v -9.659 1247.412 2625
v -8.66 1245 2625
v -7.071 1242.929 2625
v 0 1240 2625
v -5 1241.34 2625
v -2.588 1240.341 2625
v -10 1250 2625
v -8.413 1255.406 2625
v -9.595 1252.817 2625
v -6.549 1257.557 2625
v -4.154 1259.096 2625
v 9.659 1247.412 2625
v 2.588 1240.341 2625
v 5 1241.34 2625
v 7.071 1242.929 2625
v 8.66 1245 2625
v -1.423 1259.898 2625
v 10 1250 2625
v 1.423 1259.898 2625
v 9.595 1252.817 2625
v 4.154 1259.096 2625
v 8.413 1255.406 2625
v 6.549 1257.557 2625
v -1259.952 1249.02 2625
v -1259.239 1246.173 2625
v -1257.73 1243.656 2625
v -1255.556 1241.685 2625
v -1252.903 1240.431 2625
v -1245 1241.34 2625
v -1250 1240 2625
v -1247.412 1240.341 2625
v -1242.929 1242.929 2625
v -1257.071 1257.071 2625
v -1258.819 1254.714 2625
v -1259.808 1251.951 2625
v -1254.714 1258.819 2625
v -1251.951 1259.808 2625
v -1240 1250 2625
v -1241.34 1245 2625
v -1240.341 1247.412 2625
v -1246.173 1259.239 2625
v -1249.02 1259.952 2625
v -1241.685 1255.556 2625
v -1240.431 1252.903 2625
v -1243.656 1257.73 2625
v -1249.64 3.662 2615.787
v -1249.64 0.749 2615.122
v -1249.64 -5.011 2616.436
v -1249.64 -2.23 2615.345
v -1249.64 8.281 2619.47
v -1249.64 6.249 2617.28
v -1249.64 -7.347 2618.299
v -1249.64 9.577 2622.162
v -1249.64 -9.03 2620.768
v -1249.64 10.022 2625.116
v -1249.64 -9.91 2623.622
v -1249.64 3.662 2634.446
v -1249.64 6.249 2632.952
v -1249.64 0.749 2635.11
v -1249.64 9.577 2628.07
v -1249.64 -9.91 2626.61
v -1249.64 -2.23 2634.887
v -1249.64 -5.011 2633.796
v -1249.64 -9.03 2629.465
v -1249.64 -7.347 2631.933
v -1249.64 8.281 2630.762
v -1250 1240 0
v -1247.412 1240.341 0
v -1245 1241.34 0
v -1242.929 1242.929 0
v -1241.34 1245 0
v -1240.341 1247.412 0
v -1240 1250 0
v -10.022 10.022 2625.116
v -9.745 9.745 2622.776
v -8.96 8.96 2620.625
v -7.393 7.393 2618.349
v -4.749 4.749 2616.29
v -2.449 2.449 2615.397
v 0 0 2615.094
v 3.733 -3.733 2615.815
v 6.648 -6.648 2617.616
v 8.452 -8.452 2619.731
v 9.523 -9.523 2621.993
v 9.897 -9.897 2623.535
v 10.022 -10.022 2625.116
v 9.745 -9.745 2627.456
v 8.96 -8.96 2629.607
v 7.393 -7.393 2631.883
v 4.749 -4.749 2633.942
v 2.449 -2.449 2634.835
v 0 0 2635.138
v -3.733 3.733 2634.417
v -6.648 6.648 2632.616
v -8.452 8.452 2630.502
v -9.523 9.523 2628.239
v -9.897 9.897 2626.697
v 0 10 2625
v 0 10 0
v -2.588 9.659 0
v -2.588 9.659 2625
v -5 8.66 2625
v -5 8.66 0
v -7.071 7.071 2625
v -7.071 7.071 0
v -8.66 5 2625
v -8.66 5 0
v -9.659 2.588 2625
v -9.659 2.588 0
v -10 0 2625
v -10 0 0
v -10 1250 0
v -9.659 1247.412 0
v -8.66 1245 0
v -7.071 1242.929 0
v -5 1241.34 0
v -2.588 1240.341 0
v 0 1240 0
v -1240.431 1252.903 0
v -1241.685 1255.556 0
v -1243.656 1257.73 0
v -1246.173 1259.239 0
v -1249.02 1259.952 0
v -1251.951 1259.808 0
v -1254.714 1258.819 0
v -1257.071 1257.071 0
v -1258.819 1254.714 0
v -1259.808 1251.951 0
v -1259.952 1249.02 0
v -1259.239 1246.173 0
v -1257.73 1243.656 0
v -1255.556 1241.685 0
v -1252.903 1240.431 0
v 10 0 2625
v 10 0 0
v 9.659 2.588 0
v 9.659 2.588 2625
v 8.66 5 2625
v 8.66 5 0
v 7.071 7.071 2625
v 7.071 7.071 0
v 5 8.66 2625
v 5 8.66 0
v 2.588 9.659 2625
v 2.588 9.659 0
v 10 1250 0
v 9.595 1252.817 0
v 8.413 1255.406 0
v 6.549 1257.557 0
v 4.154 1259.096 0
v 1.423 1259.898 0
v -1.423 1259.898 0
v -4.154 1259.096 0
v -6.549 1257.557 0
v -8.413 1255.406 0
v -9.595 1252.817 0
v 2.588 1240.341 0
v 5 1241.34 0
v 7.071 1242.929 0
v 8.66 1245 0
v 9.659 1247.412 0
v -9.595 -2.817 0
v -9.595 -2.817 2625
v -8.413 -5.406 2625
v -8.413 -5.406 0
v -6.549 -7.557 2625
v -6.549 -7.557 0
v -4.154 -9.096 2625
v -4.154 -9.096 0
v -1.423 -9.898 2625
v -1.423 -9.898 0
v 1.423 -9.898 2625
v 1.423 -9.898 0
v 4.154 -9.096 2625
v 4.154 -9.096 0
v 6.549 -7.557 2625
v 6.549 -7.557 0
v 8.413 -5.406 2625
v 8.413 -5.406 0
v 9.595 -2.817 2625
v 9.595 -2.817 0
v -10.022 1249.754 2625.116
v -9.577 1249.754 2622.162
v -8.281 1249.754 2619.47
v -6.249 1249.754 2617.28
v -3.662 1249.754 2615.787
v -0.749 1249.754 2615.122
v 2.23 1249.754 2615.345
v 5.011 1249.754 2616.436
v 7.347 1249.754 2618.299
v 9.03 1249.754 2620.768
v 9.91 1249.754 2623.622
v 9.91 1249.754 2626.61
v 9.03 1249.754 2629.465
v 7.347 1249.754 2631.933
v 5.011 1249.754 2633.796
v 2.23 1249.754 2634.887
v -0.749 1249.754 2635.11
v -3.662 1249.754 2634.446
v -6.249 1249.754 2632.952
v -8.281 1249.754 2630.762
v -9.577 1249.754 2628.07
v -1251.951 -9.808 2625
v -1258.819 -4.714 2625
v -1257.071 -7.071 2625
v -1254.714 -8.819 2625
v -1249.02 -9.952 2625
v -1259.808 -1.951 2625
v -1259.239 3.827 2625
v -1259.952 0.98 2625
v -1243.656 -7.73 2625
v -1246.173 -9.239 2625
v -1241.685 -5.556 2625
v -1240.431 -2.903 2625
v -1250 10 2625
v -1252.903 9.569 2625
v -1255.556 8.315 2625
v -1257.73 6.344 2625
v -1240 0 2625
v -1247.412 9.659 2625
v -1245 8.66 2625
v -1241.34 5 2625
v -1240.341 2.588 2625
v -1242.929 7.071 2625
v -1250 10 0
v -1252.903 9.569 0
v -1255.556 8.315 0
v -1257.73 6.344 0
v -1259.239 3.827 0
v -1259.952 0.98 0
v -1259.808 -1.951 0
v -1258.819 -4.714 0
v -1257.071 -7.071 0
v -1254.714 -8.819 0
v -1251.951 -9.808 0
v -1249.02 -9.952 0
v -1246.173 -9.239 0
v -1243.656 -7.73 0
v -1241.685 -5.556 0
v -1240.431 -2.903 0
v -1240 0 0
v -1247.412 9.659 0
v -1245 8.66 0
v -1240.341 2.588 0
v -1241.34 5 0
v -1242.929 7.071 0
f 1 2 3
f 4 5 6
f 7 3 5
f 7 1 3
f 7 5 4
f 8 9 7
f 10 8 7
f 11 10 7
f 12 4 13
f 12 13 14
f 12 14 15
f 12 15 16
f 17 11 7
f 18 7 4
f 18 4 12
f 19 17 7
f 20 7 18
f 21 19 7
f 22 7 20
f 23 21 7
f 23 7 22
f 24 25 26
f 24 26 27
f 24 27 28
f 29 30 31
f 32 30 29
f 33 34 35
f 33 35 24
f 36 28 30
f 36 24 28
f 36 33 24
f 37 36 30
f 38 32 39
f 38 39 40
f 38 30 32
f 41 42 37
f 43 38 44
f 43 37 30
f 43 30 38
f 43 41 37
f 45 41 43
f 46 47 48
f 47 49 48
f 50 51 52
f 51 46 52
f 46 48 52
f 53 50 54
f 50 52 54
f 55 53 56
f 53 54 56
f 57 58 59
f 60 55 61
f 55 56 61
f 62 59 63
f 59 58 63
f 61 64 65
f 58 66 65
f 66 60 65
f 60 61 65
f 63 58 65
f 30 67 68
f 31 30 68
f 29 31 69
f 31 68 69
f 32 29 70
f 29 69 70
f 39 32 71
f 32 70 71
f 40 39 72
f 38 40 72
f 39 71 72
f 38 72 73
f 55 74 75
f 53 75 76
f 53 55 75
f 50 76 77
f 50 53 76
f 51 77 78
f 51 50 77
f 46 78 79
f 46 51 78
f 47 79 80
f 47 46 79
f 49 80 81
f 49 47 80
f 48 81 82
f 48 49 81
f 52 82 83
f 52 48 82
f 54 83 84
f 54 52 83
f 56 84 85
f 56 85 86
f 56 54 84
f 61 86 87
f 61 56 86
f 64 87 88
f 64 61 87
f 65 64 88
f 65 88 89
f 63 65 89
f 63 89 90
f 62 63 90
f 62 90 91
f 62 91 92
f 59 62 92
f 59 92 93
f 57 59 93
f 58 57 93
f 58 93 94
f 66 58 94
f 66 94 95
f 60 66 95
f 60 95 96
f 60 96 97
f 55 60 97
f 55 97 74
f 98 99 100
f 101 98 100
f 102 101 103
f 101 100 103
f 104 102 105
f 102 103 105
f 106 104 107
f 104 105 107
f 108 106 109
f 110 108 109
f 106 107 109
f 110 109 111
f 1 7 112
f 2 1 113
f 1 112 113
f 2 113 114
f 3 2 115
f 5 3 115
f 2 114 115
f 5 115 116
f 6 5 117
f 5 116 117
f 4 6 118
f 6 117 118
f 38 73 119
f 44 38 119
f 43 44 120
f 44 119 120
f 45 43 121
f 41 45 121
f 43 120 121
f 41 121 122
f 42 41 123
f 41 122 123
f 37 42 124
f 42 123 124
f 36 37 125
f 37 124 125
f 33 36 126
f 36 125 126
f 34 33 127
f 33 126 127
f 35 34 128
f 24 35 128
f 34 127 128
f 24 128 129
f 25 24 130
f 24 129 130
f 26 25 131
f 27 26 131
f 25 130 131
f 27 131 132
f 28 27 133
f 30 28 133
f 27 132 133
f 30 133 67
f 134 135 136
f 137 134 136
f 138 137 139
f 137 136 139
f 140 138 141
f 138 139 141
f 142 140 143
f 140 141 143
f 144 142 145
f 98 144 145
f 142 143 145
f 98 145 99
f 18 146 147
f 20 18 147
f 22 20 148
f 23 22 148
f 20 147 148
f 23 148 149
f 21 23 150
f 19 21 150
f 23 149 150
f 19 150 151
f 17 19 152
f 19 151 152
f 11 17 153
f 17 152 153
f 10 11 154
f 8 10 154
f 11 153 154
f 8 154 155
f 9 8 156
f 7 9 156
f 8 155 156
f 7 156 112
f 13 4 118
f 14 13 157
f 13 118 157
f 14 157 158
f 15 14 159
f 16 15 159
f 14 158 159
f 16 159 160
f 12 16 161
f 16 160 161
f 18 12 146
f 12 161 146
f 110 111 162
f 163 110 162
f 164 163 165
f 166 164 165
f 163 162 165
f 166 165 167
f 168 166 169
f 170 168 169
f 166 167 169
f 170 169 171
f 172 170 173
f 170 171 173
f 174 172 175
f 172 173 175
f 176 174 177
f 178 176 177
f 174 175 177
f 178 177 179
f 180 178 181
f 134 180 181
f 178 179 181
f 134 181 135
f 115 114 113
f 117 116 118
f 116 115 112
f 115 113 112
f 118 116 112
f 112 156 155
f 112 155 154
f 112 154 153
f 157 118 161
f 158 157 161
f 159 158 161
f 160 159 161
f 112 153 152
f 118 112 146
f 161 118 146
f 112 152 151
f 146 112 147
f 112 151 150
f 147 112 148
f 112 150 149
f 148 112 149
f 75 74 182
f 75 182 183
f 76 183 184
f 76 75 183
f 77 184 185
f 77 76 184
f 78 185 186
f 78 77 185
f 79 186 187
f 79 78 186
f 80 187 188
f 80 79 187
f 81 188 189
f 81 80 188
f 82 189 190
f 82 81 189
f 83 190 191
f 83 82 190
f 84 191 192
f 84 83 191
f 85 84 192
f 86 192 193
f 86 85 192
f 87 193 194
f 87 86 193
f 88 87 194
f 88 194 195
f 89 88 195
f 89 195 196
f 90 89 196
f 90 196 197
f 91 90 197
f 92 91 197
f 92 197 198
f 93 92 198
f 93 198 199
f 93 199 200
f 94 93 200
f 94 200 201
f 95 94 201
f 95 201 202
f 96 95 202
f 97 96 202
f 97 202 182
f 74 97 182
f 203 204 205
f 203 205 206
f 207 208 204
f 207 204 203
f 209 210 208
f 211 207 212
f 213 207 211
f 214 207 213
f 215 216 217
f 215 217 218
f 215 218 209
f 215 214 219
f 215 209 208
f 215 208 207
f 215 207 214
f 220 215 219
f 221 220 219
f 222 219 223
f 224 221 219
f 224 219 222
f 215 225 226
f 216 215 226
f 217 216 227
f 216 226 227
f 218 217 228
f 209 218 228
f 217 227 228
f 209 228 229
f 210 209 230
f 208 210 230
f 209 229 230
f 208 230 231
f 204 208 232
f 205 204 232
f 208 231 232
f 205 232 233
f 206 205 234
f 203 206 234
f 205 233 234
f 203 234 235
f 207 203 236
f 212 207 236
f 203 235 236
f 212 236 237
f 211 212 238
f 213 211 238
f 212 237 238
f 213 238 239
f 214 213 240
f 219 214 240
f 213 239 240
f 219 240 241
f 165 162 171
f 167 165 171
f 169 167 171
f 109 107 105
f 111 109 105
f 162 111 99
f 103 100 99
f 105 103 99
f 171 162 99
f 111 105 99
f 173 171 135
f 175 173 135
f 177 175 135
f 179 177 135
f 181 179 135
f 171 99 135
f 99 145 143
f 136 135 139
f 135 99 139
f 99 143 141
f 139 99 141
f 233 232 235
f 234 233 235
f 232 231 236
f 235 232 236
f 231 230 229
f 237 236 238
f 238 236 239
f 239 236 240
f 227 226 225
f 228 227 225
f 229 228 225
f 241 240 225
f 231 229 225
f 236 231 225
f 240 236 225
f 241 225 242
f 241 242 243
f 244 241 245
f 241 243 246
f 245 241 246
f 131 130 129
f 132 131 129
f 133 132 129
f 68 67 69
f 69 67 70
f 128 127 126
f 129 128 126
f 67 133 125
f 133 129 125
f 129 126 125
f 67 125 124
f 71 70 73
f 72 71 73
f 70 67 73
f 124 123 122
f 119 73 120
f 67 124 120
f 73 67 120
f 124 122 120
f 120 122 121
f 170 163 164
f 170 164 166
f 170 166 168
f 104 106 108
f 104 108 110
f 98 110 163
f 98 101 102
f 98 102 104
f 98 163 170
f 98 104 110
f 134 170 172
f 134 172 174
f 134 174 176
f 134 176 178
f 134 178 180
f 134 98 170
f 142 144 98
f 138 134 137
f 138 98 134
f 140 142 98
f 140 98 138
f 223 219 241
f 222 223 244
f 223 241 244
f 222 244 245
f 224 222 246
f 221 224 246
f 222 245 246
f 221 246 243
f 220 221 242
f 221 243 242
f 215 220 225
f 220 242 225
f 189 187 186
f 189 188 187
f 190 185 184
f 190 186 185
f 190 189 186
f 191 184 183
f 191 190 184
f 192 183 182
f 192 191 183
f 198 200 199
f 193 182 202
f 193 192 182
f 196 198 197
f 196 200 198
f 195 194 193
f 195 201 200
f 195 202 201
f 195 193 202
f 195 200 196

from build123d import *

# Parameters (mm, degrees)
F1_DEPTH = 2625
F4_R     = 10.0223853087


with BuildPart() as f1:
    # F0 (on Top) → F1 (new body)
    with BuildSketch(Plane.XY):
        with BuildLine():
            Line((0, 1250), (0, 1240))
            ThreePointArc((0, 1240), (7.0710678119, 1242.9289321881), (10, 1250))
            ThreePointArc((10, 1250), (0, 1260), (-10, 1250))
            Line((-10, 1250), (0, 1250))
        make_face()
        with BuildLine():
            ThreePointArc((-10, 1250), (-7.0710678119, 1242.9289321881), (0, 1240))
            Line((0, 1240), (0, 1250))
            Line((0, 1250), (-10, 1250))
        make_face()
    extrude(amount=F1_DEPTH)


with BuildPart() as f1b:
    # F0 (on Top) → F1, piece 2 (new body)
    with BuildSketch(Plane.XY):
        with BuildLine():
            Line((-1250, 1250), (-1240, 1250))
            ThreePointArc((-1240, 1250), (-1257.0710678119, 1257.0710678119), (-1250, 1240))
            Line((-1250, 1240), (-1250, 1250))
        make_face()
        with BuildLine():
            ThreePointArc((-1250, 1240), (-1242.9289321881, 1242.9289321881), (-1240, 1250))
            Line((-1240, 1250), (-1250, 1250))
            Line((-1250, 1250), (-1250, 1240))
        make_face()
    extrude(amount=F1_DEPTH)


with BuildPart() as f1c:
    # F0 (on Top) → F1, piece 3 (new body)
    with BuildSketch(Plane.XY):
        with BuildLine():
            ThreePointArc((-1250, 10), (-1257.0710678119, -7.0710678119), (-1240, 0))
            Line((-1240, 0), (-1250, 0))
            Line((-1250, 0), (-1250, 10))
        make_face()
        with BuildLine():
            Line((-1250, 0), (-1240, 0))
            ThreePointArc((-1240, 0), (-1242.9289321881, 7.0710678119), (-1250, 10))
            Line((-1250, 10), (-1250, 0))
        make_face()
    extrude(amount=F1_DEPTH)


with BuildPart() as f1d:
    # F0 (on Top) → F1, piece 4 (new body)
    with BuildSketch(Plane.XY):
        with BuildLine():
            Line((0, 10), (0, 0))
            Line((0, 0), (-10, 0))
            ThreePointArc((-10, 0), (0, -10), (10, 0))
            ThreePointArc((10, 0), (7.0710678119, 7.0710678119), (0, 10))
        make_face()
        with BuildLine():
            Line((-10, 0), (0, 0))
            Line((0, 0), (0, 10))
            ThreePointArc((0, 10), (-7.0710678119, 7.0710678119), (-10, 0))
        make_face()
    extrude(amount=F1_DEPTH)


with BuildPart() as f5:
    # F5: sweep along a path in F2
    with BuildLine(Plane.XY.offset(2625)) as f5_path:
        Line((0, 1249.7537136078), (0, 0))
        Line((0, 0), (-1249.6398687363, 0))
    # F4 (on line) → F5 (sweep)
    with BuildSketch(Plane(origin=(0, 0, 0), x_dir=(-1, 0, 0), z_dir=(0, 1, 0))):
        with Locations((0, 2625.116109848)):
            Circle(F4_R)
    sweep(path=f5_path.line, transition=Transition.RIGHT)


solid = Compound([f1.part, f1b.part, f1c.part, f1d.part, f5.part])
